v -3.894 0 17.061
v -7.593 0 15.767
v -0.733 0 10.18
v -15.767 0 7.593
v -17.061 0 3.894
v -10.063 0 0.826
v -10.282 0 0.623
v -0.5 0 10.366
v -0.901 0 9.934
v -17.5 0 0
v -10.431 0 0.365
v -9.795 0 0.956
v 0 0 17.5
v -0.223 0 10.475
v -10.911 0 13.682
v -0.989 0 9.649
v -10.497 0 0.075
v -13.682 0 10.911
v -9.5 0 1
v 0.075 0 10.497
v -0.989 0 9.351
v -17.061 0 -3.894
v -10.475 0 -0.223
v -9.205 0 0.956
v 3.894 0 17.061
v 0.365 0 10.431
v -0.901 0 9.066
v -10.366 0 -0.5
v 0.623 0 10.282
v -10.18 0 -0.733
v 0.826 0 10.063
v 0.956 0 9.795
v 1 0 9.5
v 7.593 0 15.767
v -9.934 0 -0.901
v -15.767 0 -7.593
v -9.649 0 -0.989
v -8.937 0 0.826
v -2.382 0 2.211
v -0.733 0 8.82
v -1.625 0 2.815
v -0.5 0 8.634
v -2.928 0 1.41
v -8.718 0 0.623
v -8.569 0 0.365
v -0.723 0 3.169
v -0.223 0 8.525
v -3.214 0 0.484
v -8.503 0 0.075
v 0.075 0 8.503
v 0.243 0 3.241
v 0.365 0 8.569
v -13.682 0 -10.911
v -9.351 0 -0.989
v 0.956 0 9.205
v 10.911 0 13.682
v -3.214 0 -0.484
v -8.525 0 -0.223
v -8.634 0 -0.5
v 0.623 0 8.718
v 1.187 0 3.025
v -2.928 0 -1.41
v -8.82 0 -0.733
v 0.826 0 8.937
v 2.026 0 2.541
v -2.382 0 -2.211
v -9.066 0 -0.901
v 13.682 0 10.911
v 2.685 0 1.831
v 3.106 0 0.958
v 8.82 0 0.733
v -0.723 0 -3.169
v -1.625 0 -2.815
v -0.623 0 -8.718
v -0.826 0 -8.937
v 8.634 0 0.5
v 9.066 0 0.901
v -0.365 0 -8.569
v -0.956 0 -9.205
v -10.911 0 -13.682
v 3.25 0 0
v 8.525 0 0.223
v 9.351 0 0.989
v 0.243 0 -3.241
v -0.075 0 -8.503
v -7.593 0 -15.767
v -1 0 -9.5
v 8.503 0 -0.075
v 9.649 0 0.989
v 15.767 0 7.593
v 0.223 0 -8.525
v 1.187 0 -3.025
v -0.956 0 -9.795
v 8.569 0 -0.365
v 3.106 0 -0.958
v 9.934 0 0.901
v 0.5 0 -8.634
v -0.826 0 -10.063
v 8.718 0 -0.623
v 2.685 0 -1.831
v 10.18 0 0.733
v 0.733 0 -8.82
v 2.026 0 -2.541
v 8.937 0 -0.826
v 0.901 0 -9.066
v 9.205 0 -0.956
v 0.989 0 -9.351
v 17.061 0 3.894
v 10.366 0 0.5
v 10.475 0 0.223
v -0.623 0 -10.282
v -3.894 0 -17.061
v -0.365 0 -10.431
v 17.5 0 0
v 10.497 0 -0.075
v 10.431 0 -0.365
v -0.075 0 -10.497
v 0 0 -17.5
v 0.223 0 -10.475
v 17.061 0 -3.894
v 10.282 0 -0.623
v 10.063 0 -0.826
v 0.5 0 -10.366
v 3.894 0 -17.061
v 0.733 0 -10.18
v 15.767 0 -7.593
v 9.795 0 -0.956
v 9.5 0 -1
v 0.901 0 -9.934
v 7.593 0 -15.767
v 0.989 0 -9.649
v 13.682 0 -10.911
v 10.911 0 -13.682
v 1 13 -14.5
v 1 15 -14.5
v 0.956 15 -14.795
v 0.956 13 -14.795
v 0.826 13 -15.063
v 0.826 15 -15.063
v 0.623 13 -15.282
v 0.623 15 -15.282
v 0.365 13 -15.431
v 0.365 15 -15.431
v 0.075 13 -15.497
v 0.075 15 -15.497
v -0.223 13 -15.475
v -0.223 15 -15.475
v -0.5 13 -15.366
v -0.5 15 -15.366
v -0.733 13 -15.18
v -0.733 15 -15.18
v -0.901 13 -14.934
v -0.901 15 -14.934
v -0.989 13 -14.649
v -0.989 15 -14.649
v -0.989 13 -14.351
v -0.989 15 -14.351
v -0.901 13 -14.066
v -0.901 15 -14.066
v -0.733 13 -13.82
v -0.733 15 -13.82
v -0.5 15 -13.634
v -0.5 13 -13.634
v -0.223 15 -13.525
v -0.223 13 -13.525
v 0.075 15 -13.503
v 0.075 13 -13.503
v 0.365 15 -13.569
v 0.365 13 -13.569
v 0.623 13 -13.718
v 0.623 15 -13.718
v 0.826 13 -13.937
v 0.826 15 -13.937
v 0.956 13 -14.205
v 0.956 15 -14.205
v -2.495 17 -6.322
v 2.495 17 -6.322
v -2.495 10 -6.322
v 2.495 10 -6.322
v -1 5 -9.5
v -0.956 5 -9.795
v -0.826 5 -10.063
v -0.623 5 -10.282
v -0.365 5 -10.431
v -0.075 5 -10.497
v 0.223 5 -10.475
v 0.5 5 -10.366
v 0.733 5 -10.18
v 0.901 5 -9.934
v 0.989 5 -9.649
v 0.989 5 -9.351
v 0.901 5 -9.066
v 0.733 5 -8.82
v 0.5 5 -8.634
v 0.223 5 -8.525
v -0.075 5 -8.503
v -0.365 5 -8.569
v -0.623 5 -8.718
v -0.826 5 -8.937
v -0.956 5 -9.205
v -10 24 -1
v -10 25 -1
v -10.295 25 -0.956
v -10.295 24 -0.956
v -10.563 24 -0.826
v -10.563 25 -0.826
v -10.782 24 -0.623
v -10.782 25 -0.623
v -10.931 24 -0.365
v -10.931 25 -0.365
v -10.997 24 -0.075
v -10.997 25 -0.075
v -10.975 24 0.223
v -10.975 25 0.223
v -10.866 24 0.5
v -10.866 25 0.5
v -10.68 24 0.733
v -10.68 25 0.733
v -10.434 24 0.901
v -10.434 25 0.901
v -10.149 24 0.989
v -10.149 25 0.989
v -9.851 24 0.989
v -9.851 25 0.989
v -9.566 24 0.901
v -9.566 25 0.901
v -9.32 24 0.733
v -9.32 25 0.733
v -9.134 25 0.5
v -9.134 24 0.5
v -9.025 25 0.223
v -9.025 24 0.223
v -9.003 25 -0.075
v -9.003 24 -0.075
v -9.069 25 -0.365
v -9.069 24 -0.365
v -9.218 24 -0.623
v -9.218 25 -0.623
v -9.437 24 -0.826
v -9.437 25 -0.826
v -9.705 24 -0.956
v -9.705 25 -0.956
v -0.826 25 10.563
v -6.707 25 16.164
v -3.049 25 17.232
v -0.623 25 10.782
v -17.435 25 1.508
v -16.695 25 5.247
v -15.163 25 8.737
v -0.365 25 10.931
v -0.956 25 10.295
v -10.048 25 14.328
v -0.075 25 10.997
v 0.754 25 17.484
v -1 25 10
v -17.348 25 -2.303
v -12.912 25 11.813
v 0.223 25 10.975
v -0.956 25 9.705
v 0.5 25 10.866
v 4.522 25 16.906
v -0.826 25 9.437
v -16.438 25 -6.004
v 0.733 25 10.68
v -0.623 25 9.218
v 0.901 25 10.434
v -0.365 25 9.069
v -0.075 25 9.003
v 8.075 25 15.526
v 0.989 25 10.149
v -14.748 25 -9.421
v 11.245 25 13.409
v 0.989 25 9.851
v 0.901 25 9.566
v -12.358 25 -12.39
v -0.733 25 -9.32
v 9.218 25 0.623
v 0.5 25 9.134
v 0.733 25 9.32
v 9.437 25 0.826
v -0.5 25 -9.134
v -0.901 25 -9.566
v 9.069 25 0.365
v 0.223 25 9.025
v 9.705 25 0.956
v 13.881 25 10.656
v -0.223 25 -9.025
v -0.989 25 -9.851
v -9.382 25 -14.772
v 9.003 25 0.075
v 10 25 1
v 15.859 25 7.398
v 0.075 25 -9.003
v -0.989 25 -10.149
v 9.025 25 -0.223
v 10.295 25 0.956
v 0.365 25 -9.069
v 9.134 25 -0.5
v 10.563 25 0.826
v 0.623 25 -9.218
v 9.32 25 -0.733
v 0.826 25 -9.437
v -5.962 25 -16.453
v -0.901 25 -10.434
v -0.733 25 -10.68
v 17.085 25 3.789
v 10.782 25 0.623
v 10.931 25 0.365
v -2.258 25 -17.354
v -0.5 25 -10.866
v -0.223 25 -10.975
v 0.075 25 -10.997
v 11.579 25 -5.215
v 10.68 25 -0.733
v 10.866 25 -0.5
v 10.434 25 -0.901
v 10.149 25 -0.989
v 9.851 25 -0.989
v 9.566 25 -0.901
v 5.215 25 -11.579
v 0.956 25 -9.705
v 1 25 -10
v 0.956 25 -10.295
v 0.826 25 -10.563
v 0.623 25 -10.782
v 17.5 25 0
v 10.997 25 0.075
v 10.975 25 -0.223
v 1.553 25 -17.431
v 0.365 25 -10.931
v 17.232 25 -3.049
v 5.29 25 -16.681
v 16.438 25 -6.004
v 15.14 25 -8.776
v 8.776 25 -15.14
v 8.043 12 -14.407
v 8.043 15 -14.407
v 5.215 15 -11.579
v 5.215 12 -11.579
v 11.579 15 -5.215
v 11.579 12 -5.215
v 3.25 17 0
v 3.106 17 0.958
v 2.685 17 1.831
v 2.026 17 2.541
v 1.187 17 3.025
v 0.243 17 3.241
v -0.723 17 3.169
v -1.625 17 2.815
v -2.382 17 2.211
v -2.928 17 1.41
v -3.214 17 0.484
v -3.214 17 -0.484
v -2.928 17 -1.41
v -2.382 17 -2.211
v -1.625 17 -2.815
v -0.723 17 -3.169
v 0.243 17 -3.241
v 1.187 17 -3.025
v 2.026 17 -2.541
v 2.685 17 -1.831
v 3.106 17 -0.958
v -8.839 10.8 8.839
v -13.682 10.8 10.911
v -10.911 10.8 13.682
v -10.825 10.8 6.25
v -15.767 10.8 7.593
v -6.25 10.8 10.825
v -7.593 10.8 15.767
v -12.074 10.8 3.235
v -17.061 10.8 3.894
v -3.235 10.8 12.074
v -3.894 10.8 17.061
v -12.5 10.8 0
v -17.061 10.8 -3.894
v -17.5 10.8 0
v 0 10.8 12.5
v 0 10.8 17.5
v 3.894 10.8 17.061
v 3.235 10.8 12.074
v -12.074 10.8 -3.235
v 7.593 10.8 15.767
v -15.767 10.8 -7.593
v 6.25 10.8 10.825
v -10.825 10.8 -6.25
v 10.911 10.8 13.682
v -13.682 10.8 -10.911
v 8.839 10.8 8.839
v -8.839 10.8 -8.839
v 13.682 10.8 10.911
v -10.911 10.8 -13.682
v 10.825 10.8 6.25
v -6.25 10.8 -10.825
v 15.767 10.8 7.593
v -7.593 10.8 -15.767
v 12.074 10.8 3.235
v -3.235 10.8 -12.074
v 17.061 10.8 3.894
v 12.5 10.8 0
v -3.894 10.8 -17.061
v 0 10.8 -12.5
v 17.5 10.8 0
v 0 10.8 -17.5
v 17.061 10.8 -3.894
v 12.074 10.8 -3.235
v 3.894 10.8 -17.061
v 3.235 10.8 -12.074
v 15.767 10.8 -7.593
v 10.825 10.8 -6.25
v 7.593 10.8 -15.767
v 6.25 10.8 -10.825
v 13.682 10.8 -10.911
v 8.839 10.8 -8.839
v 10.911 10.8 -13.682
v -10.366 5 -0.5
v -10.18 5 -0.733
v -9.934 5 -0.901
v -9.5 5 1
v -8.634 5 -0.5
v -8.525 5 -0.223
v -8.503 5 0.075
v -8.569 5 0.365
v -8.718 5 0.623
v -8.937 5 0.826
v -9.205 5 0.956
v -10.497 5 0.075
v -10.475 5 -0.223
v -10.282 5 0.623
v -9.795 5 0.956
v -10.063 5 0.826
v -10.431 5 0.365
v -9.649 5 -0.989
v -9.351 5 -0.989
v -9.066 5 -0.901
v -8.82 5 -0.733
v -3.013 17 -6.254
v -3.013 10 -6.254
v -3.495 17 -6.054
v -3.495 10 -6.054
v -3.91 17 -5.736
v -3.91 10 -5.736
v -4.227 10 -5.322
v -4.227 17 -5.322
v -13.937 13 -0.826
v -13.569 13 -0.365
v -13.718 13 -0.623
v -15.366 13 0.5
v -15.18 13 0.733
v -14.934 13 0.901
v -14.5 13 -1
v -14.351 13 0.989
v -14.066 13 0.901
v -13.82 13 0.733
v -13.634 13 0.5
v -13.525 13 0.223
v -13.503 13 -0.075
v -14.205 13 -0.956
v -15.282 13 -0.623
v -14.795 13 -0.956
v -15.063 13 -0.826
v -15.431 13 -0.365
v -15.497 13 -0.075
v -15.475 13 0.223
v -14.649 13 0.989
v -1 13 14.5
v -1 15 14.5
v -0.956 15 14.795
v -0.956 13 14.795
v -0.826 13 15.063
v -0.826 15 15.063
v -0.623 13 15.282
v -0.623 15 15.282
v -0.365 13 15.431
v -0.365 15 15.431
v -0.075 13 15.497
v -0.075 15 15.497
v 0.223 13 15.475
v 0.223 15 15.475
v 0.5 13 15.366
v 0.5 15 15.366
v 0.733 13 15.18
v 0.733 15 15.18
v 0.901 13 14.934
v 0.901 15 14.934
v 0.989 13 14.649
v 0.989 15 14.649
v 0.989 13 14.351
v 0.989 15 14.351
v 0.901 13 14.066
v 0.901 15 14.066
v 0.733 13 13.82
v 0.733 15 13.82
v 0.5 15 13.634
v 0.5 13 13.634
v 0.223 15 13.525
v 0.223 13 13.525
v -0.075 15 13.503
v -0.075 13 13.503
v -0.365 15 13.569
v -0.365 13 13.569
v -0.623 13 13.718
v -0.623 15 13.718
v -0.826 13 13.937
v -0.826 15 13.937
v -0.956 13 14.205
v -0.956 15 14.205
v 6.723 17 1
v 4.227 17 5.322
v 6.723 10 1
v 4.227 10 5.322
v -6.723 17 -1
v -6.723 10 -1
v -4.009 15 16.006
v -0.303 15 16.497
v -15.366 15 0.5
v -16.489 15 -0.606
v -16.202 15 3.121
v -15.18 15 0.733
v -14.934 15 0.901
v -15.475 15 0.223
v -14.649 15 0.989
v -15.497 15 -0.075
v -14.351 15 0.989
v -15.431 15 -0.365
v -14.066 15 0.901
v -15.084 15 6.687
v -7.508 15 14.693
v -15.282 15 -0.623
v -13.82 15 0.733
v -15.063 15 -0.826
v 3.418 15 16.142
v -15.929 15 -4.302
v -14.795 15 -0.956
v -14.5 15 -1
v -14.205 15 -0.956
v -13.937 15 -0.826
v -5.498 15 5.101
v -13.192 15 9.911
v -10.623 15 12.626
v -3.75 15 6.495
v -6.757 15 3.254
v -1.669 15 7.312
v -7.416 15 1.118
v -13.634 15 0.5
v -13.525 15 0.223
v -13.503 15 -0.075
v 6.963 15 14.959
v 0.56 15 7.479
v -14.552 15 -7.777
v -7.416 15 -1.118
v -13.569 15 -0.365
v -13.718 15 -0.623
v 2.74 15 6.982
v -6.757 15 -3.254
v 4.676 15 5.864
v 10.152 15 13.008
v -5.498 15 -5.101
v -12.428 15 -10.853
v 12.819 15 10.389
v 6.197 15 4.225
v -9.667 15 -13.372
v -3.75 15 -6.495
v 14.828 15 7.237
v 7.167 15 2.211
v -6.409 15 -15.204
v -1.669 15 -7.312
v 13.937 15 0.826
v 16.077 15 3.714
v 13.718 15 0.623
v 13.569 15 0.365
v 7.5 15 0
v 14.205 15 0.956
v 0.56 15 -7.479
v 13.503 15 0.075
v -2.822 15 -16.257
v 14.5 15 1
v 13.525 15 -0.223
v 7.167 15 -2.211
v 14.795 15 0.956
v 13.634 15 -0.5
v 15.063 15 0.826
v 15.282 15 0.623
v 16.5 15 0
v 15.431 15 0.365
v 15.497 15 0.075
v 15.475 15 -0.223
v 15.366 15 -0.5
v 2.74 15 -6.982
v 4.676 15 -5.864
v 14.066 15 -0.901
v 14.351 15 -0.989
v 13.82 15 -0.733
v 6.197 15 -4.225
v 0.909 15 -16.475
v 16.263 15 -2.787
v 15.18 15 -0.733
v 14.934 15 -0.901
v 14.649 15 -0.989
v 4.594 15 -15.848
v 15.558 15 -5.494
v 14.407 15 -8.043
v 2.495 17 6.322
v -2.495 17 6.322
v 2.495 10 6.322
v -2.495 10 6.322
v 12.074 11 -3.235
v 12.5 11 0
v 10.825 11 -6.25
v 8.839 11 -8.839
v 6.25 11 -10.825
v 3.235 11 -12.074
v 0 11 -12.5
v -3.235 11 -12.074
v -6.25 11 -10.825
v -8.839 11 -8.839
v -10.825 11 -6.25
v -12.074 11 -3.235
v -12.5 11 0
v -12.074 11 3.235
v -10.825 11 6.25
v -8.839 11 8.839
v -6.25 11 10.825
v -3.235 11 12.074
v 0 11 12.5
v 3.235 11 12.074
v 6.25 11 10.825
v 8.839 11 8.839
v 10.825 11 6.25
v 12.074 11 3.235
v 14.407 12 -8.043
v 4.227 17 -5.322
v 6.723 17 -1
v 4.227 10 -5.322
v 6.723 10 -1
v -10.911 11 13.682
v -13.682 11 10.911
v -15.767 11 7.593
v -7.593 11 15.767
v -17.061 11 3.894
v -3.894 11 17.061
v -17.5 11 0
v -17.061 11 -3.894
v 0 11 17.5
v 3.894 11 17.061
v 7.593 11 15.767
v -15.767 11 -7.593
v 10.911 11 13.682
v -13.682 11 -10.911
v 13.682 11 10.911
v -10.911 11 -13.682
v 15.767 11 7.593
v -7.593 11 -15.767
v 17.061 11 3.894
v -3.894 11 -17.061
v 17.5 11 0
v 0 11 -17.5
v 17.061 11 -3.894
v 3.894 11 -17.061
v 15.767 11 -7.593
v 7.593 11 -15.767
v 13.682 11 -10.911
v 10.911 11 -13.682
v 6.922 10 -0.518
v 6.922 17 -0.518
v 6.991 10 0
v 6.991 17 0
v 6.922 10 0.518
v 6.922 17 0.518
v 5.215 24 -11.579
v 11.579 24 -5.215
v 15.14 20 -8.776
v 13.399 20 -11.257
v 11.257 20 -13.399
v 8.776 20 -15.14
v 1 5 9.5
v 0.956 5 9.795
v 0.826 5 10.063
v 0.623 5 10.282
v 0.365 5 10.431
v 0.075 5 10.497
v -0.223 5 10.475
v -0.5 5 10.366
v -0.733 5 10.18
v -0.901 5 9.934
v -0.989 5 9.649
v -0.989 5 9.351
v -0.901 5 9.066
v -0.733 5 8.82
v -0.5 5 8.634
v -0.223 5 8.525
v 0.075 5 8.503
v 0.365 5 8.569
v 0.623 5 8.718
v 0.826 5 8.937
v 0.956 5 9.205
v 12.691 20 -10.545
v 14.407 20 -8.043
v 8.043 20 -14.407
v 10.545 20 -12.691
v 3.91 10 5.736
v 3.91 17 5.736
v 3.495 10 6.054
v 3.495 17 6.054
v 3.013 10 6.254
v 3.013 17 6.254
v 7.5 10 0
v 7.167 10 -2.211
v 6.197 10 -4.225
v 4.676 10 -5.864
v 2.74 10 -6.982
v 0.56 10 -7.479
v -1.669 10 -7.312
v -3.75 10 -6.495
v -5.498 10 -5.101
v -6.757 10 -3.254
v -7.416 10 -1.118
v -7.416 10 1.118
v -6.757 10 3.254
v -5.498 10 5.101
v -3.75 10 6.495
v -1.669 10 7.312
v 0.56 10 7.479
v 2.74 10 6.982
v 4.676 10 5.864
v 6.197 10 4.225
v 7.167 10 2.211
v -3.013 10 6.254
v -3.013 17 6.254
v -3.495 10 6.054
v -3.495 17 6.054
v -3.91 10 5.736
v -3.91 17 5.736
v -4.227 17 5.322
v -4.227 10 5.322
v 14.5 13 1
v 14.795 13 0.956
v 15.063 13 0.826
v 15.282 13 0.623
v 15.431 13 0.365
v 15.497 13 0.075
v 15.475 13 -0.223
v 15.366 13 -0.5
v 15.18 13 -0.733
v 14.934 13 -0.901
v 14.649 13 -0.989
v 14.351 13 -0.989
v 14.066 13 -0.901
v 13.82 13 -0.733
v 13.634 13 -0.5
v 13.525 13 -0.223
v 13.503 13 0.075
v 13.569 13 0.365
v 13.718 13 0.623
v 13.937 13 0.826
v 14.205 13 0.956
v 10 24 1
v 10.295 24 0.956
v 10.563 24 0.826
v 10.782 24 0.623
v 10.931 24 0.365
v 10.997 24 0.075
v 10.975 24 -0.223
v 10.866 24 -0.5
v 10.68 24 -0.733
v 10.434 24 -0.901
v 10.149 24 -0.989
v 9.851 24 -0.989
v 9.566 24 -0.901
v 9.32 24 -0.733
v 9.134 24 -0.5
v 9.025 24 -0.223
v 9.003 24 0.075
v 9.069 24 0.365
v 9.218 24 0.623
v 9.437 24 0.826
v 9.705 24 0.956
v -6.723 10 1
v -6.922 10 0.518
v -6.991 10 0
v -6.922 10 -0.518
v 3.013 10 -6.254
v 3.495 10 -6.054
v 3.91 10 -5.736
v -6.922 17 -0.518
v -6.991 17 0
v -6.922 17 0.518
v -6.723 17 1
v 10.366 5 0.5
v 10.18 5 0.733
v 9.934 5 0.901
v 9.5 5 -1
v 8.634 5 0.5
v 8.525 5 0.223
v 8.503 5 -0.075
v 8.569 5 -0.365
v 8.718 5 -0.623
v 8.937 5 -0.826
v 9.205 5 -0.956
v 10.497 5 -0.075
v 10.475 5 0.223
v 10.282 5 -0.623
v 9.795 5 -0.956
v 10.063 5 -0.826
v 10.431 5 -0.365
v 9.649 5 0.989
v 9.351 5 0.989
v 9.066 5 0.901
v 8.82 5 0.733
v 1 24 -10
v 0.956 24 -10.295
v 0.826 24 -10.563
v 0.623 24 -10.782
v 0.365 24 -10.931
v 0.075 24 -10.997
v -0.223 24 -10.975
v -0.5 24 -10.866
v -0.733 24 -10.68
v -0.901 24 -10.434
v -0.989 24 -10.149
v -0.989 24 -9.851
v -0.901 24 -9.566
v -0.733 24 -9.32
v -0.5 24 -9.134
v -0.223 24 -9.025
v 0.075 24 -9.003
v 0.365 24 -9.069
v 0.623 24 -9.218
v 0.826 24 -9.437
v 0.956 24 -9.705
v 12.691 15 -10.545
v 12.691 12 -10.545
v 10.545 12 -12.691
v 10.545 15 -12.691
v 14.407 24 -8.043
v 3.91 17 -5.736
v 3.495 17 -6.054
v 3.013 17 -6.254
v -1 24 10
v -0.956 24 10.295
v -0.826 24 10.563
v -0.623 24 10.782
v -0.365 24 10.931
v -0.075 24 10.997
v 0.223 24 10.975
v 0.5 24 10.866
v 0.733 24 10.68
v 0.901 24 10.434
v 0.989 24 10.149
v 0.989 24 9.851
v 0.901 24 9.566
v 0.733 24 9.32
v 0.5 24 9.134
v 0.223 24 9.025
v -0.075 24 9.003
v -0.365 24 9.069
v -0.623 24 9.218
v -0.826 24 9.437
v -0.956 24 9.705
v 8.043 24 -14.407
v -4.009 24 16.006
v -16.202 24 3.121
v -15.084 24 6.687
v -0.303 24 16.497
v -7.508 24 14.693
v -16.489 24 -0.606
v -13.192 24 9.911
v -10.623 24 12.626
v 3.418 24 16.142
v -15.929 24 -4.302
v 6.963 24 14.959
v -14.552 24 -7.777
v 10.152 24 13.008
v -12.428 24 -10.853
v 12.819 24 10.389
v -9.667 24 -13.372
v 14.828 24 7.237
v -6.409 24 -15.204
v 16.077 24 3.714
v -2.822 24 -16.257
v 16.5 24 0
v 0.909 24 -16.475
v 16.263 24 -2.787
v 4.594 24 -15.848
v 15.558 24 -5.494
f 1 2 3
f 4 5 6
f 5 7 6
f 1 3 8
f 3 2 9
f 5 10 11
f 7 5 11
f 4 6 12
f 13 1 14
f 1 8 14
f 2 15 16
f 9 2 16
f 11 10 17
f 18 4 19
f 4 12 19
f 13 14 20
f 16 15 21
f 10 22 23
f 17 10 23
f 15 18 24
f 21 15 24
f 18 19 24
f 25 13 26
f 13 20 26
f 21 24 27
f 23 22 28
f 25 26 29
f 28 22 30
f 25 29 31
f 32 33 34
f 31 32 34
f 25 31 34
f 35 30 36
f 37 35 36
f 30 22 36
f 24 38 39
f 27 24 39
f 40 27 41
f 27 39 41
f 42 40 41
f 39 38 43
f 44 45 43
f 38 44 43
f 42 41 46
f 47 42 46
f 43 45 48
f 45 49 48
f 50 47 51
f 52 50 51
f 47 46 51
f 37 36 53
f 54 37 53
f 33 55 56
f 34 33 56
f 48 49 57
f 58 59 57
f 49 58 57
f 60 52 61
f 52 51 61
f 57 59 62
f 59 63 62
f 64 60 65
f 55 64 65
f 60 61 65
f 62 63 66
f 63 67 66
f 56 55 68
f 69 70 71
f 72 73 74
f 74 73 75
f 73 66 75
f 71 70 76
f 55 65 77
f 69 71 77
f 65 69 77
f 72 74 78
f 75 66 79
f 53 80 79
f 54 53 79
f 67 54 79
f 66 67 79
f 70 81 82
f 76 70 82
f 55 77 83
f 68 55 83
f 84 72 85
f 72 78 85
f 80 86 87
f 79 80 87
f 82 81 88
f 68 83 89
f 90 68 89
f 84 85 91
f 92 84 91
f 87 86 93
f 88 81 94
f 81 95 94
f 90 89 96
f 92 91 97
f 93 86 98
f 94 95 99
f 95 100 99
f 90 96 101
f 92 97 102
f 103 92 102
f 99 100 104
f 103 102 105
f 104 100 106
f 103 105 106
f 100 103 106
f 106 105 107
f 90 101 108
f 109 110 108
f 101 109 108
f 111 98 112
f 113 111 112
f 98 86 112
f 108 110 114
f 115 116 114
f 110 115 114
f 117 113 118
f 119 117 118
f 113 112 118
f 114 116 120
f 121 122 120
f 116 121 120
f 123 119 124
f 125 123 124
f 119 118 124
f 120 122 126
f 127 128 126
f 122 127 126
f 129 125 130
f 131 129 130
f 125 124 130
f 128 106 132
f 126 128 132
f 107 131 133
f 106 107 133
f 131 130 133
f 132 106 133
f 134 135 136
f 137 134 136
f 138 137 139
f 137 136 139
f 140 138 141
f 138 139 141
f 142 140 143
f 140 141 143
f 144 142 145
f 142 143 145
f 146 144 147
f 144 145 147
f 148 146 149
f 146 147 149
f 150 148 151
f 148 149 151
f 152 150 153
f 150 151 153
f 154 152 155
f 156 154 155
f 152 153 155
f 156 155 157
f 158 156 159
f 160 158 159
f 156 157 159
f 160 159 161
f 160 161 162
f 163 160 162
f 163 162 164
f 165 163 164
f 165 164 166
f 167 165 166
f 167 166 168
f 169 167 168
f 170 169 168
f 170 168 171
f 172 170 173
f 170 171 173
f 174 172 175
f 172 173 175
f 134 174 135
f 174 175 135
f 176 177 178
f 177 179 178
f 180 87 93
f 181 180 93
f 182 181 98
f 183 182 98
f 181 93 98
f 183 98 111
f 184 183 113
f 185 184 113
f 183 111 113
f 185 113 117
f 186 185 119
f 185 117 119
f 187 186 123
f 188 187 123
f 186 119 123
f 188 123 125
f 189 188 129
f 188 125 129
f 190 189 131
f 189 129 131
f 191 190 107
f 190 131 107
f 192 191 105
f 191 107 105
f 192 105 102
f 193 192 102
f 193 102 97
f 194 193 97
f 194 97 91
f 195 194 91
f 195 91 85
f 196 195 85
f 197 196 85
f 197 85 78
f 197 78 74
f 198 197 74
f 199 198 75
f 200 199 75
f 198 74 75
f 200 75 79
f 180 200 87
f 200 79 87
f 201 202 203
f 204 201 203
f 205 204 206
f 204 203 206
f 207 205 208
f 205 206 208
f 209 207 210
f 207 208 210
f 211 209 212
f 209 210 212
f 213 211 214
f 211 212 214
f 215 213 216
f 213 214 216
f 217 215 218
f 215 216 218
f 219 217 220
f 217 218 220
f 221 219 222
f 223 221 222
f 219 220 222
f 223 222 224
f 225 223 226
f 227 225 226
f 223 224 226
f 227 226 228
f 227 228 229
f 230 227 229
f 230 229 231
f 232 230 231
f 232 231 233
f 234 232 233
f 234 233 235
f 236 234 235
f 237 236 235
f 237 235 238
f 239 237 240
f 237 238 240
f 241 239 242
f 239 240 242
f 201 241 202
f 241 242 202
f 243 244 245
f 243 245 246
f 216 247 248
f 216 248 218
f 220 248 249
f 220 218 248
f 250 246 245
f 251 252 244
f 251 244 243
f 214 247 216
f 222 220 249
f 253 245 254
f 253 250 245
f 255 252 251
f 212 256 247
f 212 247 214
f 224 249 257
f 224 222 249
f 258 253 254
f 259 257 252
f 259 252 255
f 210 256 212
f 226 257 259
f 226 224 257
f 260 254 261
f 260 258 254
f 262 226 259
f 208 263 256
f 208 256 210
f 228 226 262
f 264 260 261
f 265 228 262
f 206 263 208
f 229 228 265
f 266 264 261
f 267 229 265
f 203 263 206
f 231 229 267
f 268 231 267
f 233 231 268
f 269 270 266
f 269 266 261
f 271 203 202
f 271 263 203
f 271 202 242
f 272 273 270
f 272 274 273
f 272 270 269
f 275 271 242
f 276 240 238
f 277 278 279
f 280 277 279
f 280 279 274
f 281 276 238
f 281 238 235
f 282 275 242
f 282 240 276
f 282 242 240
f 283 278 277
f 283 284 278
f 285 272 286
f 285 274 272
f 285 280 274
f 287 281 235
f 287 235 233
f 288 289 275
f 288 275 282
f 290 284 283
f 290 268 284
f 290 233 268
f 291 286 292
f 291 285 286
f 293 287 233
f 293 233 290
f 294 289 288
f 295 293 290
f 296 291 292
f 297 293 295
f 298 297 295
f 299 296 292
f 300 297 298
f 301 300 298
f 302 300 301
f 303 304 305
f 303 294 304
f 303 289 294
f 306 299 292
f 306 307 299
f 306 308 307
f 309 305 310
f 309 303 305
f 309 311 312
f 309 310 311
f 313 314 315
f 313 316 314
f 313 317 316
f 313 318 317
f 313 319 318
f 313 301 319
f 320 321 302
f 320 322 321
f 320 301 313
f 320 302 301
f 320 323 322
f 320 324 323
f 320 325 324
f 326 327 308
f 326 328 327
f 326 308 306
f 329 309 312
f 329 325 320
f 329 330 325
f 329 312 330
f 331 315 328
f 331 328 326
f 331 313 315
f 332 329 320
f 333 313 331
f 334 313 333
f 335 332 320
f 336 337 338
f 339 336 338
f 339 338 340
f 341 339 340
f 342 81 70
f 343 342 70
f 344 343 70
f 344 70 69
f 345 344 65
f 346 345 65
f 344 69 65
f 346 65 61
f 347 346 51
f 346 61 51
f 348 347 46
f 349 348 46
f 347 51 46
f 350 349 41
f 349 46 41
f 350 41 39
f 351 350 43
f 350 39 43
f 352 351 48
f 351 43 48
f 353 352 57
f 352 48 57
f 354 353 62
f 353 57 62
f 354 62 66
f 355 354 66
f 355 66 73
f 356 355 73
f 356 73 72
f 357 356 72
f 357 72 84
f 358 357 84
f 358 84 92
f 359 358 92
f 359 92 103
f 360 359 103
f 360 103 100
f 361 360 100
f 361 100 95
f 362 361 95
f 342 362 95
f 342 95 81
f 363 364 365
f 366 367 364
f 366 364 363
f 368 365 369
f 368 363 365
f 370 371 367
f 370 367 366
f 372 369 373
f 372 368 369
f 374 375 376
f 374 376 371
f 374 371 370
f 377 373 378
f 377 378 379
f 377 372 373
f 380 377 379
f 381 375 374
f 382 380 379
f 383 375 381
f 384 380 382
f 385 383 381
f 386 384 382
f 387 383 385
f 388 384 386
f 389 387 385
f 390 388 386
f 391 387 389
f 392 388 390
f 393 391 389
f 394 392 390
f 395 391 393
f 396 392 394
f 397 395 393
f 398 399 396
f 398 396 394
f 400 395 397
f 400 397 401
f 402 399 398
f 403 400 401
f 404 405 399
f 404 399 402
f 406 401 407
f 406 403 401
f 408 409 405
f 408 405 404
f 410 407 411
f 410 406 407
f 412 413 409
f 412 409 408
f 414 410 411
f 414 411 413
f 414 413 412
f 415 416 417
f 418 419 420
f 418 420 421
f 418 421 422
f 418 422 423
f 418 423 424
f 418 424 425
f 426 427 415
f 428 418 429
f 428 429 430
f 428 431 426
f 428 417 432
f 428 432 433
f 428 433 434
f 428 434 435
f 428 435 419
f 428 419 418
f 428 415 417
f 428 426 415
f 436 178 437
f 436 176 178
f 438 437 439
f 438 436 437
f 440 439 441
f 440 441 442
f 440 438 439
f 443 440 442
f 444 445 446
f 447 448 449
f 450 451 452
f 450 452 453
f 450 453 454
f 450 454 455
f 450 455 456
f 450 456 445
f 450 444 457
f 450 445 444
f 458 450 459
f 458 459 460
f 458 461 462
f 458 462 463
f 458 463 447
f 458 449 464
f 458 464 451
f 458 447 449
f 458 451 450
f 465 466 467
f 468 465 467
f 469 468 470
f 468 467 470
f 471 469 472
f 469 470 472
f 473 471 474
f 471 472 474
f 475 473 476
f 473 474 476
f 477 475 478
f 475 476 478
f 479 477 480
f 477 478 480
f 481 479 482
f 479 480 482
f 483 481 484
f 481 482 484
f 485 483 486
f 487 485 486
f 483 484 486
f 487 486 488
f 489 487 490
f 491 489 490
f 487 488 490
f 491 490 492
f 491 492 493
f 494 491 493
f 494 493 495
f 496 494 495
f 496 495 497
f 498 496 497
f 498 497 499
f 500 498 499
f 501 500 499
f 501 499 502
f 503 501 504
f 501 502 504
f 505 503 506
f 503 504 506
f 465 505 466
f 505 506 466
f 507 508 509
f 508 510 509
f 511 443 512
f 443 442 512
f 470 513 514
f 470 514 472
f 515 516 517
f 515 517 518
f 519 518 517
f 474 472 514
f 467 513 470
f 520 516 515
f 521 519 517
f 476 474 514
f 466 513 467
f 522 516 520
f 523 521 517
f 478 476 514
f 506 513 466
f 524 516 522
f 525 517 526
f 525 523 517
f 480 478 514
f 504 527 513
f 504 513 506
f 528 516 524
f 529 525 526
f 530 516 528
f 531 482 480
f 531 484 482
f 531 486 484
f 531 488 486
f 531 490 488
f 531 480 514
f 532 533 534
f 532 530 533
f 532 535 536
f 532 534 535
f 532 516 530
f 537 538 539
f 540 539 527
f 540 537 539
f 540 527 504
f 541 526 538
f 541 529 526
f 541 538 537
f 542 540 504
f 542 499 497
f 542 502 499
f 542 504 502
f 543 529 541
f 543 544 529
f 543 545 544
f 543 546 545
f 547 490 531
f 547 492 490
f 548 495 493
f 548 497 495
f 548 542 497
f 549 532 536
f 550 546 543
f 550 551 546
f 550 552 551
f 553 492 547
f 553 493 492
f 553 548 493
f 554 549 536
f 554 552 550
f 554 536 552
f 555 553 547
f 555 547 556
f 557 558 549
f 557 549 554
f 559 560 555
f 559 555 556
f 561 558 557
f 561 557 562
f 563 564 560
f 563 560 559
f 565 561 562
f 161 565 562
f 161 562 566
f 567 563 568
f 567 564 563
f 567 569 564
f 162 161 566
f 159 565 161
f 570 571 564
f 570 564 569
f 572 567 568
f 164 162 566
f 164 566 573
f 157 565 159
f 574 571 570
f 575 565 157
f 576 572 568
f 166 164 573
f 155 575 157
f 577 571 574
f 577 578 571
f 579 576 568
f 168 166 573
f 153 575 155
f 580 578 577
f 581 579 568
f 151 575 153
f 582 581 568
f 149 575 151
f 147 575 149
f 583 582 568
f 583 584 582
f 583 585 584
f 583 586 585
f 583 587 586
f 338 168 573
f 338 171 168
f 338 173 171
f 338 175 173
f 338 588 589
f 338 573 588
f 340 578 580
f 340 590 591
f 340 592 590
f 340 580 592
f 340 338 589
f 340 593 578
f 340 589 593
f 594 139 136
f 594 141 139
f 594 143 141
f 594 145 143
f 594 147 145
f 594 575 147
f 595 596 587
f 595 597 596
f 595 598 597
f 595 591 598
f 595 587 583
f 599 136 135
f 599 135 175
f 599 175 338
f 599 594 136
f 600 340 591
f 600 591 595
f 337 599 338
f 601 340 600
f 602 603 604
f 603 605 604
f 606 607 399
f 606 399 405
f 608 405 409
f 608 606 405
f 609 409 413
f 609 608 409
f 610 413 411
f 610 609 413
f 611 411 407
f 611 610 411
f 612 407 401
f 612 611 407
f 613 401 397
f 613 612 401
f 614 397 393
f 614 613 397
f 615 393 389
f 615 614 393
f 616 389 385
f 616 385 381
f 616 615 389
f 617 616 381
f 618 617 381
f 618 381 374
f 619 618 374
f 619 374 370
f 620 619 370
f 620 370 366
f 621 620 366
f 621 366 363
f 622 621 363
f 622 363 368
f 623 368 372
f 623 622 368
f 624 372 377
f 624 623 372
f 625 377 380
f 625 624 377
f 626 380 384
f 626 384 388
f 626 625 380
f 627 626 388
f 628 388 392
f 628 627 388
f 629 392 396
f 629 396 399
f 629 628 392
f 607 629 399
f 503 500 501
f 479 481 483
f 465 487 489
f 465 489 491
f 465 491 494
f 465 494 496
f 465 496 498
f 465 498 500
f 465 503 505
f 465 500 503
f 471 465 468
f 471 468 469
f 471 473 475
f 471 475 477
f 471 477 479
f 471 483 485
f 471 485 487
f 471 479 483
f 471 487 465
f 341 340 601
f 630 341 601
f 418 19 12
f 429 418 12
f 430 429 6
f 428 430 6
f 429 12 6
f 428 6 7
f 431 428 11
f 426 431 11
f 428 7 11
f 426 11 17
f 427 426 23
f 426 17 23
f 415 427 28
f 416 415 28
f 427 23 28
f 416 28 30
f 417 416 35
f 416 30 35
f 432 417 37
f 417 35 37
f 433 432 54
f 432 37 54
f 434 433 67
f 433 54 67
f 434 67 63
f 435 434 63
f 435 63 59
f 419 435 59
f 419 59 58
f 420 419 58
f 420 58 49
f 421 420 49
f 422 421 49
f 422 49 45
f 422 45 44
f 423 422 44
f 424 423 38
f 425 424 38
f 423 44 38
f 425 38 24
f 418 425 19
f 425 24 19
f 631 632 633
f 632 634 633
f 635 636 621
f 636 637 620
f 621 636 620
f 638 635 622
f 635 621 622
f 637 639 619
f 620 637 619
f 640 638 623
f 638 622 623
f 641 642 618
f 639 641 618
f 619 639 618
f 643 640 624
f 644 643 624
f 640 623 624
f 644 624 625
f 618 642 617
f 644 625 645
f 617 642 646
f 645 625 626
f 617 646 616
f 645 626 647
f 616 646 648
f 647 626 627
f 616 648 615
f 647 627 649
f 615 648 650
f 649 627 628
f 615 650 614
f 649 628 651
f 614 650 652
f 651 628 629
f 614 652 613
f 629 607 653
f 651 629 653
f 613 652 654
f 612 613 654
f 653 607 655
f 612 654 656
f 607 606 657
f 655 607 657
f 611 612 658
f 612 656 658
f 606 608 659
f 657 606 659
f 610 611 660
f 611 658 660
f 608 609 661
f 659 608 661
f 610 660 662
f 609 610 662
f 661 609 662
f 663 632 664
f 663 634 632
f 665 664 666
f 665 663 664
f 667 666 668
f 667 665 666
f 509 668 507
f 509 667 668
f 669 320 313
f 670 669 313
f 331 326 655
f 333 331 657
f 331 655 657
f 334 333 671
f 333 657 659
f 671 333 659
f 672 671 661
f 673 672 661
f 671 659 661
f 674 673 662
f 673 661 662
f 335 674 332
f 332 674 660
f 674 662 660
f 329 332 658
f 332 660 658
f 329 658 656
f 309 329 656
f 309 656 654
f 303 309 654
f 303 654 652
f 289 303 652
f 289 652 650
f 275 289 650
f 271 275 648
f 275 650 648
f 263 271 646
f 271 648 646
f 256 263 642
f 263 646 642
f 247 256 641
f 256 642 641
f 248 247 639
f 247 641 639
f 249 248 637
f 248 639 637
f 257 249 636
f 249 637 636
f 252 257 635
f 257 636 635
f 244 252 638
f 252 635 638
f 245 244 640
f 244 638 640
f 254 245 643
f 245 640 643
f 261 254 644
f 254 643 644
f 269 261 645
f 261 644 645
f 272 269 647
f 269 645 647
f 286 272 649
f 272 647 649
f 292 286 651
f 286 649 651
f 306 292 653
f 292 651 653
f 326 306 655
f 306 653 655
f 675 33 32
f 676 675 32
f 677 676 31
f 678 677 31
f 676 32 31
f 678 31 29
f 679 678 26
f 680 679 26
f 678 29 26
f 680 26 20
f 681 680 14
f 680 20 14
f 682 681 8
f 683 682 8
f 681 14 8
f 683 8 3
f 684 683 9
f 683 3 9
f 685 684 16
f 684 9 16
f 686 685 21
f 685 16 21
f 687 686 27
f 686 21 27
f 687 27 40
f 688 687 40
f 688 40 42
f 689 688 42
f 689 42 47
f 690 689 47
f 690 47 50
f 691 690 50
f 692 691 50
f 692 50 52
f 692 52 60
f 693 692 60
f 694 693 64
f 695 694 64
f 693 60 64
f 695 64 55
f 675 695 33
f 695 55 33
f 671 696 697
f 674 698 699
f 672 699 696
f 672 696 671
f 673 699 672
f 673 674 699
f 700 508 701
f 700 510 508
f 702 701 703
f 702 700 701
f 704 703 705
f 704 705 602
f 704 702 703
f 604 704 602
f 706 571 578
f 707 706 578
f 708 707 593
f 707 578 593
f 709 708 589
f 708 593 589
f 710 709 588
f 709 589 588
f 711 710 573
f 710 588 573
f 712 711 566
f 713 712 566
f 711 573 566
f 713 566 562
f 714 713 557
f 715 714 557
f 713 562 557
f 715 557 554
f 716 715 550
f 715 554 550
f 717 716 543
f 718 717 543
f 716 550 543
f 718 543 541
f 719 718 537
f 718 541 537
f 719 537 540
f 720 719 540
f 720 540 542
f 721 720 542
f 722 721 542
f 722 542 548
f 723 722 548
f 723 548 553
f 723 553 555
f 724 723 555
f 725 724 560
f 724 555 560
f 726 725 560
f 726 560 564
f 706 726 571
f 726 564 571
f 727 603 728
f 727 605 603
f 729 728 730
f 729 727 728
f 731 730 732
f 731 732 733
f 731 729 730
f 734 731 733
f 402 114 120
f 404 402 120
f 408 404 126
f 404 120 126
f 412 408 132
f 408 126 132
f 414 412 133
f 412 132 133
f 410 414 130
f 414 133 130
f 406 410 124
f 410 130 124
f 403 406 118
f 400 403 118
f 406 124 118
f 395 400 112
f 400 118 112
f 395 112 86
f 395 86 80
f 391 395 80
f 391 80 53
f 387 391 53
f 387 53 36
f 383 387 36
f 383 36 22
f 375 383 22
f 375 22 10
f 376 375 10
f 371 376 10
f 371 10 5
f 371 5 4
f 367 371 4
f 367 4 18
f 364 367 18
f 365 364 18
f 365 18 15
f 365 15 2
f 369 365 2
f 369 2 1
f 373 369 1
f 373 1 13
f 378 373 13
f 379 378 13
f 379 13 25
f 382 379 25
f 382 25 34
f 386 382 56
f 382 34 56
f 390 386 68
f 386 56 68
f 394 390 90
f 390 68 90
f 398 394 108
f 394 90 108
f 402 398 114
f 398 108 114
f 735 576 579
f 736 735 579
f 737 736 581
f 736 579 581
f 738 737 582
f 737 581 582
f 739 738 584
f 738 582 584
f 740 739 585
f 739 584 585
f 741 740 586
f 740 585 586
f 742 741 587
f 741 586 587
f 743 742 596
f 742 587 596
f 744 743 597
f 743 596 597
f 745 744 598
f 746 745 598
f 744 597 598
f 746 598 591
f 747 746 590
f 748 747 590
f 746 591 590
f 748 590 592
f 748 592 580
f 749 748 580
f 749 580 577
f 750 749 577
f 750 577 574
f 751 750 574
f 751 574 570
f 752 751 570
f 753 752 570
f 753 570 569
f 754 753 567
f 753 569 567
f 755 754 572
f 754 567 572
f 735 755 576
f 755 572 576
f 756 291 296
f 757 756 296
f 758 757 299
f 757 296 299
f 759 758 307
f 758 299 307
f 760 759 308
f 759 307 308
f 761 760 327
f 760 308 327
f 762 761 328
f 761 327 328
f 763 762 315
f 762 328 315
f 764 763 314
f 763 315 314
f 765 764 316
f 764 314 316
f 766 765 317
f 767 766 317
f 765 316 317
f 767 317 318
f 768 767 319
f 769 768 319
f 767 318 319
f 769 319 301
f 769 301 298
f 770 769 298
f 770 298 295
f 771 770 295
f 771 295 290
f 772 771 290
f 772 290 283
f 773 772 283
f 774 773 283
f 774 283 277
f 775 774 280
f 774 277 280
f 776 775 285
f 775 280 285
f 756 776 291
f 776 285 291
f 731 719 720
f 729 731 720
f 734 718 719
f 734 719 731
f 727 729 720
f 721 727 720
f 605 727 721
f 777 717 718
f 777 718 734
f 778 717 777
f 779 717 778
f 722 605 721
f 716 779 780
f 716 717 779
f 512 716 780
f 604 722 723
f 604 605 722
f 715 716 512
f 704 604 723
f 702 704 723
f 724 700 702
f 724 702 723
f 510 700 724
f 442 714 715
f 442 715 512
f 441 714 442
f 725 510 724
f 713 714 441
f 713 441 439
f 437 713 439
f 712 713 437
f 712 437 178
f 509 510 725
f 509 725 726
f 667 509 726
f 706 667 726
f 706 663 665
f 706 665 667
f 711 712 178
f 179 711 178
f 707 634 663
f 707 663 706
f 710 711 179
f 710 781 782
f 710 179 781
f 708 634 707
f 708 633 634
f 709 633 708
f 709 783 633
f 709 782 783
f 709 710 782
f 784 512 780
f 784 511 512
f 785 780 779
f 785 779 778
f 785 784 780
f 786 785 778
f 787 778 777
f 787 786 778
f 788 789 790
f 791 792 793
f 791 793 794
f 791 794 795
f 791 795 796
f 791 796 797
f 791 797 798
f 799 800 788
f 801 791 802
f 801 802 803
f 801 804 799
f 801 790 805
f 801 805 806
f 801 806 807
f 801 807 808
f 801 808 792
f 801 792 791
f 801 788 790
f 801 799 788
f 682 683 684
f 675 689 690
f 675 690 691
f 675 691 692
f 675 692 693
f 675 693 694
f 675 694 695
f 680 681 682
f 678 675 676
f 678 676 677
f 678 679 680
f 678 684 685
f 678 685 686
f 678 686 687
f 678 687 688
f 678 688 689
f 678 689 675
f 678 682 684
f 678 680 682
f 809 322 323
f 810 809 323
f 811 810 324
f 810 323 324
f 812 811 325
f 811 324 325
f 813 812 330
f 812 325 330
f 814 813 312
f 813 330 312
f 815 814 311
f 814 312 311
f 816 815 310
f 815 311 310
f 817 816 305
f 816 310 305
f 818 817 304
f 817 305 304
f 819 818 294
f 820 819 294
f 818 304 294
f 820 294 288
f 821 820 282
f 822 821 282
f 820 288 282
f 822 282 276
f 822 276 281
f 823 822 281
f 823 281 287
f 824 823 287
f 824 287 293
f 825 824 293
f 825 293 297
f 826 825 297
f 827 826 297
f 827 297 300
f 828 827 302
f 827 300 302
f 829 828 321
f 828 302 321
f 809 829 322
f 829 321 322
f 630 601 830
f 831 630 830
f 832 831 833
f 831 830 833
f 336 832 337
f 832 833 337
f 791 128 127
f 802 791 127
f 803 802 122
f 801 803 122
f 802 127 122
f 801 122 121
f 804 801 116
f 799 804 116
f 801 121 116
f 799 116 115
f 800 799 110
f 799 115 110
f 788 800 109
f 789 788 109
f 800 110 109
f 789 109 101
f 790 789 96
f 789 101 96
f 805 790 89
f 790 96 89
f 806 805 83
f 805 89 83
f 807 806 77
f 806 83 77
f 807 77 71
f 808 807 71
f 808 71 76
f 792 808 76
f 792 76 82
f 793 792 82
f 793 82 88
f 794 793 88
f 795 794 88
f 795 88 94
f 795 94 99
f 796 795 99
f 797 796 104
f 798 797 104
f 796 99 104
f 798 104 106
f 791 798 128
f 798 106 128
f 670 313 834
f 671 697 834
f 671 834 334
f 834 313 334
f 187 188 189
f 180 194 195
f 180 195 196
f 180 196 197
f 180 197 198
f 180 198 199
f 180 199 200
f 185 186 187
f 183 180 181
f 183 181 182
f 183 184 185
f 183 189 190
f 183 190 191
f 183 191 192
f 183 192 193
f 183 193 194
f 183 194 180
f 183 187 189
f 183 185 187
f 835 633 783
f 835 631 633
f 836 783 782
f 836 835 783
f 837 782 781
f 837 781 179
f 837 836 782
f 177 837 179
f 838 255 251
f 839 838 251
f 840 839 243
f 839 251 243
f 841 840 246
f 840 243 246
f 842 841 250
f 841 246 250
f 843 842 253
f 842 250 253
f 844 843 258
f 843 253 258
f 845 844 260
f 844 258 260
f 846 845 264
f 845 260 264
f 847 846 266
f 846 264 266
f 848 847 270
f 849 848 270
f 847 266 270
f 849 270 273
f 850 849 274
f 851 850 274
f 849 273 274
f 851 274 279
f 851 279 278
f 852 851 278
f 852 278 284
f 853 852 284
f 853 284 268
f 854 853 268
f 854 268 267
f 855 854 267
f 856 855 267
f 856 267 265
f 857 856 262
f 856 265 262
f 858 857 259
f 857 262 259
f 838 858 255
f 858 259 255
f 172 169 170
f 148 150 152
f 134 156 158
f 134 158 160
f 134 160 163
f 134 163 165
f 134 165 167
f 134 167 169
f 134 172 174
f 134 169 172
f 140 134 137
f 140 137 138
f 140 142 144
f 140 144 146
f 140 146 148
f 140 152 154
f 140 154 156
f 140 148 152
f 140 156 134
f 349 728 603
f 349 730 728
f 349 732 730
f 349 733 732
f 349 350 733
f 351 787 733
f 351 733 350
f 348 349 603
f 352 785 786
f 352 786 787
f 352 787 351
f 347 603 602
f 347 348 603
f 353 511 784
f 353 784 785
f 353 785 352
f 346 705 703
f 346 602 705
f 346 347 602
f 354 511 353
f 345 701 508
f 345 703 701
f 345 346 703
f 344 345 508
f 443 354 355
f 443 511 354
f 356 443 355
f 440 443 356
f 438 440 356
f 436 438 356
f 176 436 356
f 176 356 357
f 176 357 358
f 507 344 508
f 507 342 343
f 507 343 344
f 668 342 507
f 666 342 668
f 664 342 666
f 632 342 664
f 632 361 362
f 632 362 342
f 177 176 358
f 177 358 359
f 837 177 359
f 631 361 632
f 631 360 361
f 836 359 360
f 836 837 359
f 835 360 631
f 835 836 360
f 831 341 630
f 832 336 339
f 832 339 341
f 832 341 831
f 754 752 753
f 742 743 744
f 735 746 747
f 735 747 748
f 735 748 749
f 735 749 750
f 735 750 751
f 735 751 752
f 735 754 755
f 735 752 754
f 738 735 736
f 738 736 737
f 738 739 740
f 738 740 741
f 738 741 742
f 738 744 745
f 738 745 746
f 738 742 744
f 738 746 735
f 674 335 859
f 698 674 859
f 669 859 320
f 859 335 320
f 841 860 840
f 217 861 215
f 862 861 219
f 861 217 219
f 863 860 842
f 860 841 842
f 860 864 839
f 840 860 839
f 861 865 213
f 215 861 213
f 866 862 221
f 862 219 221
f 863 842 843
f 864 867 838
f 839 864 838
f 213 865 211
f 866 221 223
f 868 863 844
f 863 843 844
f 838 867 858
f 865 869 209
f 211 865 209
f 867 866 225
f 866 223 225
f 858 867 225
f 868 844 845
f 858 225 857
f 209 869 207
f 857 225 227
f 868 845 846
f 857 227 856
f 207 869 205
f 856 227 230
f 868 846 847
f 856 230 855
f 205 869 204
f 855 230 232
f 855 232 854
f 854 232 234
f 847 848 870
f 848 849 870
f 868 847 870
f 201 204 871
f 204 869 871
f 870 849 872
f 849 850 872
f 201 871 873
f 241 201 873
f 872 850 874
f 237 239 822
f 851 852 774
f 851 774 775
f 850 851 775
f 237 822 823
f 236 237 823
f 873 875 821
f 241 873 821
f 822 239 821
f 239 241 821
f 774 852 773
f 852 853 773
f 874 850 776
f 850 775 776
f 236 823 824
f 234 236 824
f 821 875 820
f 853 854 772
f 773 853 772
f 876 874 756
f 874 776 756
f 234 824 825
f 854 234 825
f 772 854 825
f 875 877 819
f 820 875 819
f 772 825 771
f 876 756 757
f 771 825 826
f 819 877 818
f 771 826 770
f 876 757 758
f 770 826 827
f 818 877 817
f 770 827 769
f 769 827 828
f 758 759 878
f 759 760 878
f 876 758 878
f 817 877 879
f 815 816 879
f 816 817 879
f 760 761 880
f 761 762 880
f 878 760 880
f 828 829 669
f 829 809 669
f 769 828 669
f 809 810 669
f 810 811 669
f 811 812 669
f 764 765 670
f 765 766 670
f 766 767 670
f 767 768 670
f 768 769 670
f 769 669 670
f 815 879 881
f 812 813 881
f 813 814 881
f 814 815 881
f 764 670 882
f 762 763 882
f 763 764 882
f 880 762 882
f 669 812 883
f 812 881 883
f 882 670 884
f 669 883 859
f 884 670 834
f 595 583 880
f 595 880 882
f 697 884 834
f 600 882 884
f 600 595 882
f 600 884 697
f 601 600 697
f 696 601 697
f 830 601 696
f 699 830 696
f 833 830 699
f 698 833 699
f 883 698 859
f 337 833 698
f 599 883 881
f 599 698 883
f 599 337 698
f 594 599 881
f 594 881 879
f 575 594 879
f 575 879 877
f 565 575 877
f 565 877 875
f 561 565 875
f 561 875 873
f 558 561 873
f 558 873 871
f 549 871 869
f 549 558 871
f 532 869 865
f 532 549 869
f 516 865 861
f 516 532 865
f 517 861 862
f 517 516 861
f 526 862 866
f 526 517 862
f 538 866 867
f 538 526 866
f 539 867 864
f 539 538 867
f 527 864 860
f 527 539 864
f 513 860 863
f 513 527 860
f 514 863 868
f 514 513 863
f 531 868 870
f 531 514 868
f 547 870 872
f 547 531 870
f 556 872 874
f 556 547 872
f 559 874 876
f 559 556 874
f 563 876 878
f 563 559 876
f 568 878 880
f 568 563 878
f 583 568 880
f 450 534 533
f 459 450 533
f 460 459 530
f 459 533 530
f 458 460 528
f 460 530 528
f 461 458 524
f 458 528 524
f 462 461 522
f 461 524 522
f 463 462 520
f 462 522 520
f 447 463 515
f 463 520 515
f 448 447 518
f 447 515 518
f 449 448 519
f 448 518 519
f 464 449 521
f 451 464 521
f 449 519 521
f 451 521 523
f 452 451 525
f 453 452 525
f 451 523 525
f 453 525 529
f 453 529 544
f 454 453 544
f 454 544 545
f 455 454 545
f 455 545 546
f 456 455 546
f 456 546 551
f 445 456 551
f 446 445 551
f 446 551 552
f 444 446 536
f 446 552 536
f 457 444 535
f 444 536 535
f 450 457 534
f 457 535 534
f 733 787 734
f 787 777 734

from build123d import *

# Parameters (mm, degrees)
SKETCH1_R           = 17.5
BOSS_EXTRUDE1_DEPTH = 15
BOSS_EXTRUDE2_DEPTH = 2
CUT_EXTRUDE1_REACH  = 19
SKETCH3_R           = 3.25
SKETCH4_R           = 1
CUT_EXTRUDE2_DEPTH  = 5
CIRPATTERN1_COUNT   = 4
SKETCH5_R           = 1
CUT_EXTRUDE3_DEPTH  = 2
CIRPATTERN2_COUNT   = 4
SKETCH6_R           = 7.5
CUT_EXTRUDE4_DEPTH  = 5
CUT_EXTRUDE6_START  = -4
SKETCH7_R           = 17.5
SKETCH7_R_2         = 12.5
CUT_EXTRUDE6_DEPTH  = 0.2
FILLET1_R           = 2
CUT_EXTRUDE7_DEPTH  = 3
SKETCH9_R           = 17.5
SKETCH9_R_2         = 16.5
BOSS_EXTRUDE3_DEPTH = 10
SKETCH10_R          = 16.5
BOSS_EXTRUDE4_DEPTH = 1
CUT_EXTRUDE8_DEPTH  = 5
SKETCH12_R          = 1
CUT_EXTRUDE9_DEPTH  = 1
CIRPATTERN3_COUNT   = 4


with BuildPart() as part:
    # Sketch1 → Boss-Extrude1 (new body)
    with BuildSketch(Plane(origin=(0, 0, 0), x_dir=(1, 0, 0), z_dir=(0, 1, 0))):
        Circle(SKETCH1_R)
    extrude(amount=BOSS_EXTRUDE1_DEPTH)

    # Sketch2 → Boss-Extrude2 (add)
    with BuildSketch(Plane(origin=(0, 15, 0), x_dir=(1, 0, 0), z_dir=(0, 1, 0))):
        Polygon((7.3, 0), (3.65, 6.321985448), (-3.65, 6.321985448), (-7.3, 0), (-3.65, -6.321985448), (3.65, -6.321985448), align=None)
    extrude(amount=BOSS_EXTRUDE2_DEPTH)

    # Sketch3 → Cut-Extrude1 (cut, up to next)
    with BuildSketch(Plane.XZ, mode=Mode.PRIVATE) as cut_extrude1_sk1:
        Circle(SKETCH3_R)
    cut_extrude1_tool1 = extrude(cut_extrude1_sk1.sketch, amount=-CUT_EXTRUDE1_REACH, mode=Mode.PRIVATE) & part.part
    add(cut_extrude1_tool1.solids().sort_by_distance((0, 0, 0))[0], mode=Mode.SUBTRACT)

    # Sketch4 → Cut-Extrude2 (cut)
    with BuildSketch(Plane.XZ):
        with Locations((0, 9.5)):
            Circle(SKETCH4_R)
    cut_extrude2 = extrude(amount=-CUT_EXTRUDE2_DEPTH, mode=Mode.SUBTRACT)

    # CirPattern1: Cut-Extrude2 ×4 about axis
    cirpattern1_axis = Axis((0, 0, 0), (0, 1, 0))
    for i in range(1, CIRPATTERN1_COUNT):
        add(cut_extrude2.rotate(cirpattern1_axis, i * 360 / CIRPATTERN1_COUNT), mode=Mode.SUBTRACT)

    # Sketch5 → Cut-Extrude3 (cut)
    with BuildSketch(Plane(origin=(0, 15, 0), x_dir=(1, 0, 0), z_dir=(0, 1, 0))):
        with Locations((0, 14.5)):
            Circle(SKETCH5_R)
    cut_extrude3 = extrude(amount=-CUT_EXTRUDE3_DEPTH, mode=Mode.SUBTRACT)

    # CirPattern2: Cut-Extrude3 ×4 about axis
    cirpattern2_axis = Axis((0, 0, 0), (0, 1, 0))
    for i in range(1, CIRPATTERN2_COUNT):
        add(cut_extrude3.rotate(cirpattern2_axis, i * 360 / CIRPATTERN2_COUNT), mode=Mode.SUBTRACT)

    # Sketch6 → Cut-Extrude4 (cut)
    with BuildSketch(Plane(origin=(0, 15, 0), x_dir=(1, 0, 0), z_dir=(0, 1, 0))):
        Circle(SKETCH6_R)
        Polygon((7.3, 0), (3.65, 6.321985448), (-3.65, 6.321985448), (-7.3, 0), (-3.65, -6.321985448), (3.65, -6.321985448), align=None, mode=Mode.SUBTRACT)
    extrude(amount=-CUT_EXTRUDE4_DEPTH, mode=Mode.SUBTRACT)

    # Sketch7 → Cut-Extrude6 (cut)
    with BuildSketch(Plane(origin=(0, 15, 0), x_dir=(1, 0, 0), z_dir=(0, 1, 0)).offset(CUT_EXTRUDE6_START)):
        Circle(SKETCH7_R)
        Circle(SKETCH7_R_2, mode=Mode.SUBTRACT)
    extrude(amount=-CUT_EXTRUDE6_DEPTH, mode=Mode.SUBTRACT)

    # Fillet1
    fillet1_edges = [part.edges().sort_by_distance(p)[0] for p in [
        (-7.3, 13.5, 0),
        (-3.65, 13.5, 6.321985448),
        (3.65, 13.5, 6.321985448),
        (7.3, 13.5, 0),
        (3.65, 13.5, -6.321985448),
        (-3.65, 13.5, -6.321985448),
    ]]
    fillet(fillet1_edges, radius=FILLET1_R)

    # Sketch8 → Cut-Extrude7 (cut)
    with BuildSketch(Plane(origin=(0, 15, 0), x_dir=(1, 0, 0), z_dir=(0, 1, 0))):
        with BuildLine():
            Line((8.042991645, 14.406952676), (5.21456452, 11.578525551))
            Line((5.21456452, 11.578525551), (11.578525551, 5.21456452))
            Line((11.578525551, 5.21456452), (14.406952676, 8.042991645))
            ThreePointArc((14.406952676, 8.042991645), (11.66726189, 11.66726189), (8.042991645, 14.406952676))
        make_face()
    extrude(amount=-CUT_EXTRUDE7_DEPTH, mode=Mode.SUBTRACT)

    # Sketch9 → Boss-Extrude3 (add)
    with BuildSketch(Plane(origin=(0, 15, 0), x_dir=(1, 0, 0), z_dir=(0, 1, 0))):
        Circle(SKETCH9_R)
        Circle(SKETCH9_R_2, mode=Mode.SUBTRACT)
    extrude(amount=BOSS_EXTRUDE3_DEPTH)

    # Sketch10 → Boss-Extrude4 (add)
    with BuildSketch(Plane(origin=(0, 25, 0), x_dir=(1, 0, 0), z_dir=(0, 1, 0))):
        Circle(SKETCH10_R)
    extrude(amount=-BOSS_EXTRUDE4_DEPTH)

    # Sketch11 → Cut-Extrude8 (cut)
    with BuildSketch(Plane(origin=(0, 25, 0), x_dir=(1, 0, 0), z_dir=(0, 1, 0))):
        with BuildLine():
            Line((5.21456452, 11.578525551), (11.578525551, 5.21456452))
            Line((11.578525551, 5.21456452), (15.140241258, 8.776280228))
            ThreePointArc((15.140241258, 8.776280228), (12.374368671, 12.374368671), (8.776280228, 15.140241258))
            Line((8.776280228, 15.140241258), (5.21456452, 11.578525551))
        make_face()
    extrude(amount=-CUT_EXTRUDE8_DEPTH, mode=Mode.SUBTRACT)

    # Sketch12 → Cut-Extrude9 (cut)
    with BuildSketch(Plane(origin=(0, 25, 0), x_dir=(1, 0, 0), z_dir=(0, 1, 0))):
        with Locations((0, 10)):
            Circle(SKETCH12_R)
    cut_extrude9 = extrude(amount=-CUT_EXTRUDE9_DEPTH, mode=Mode.SUBTRACT)

    # CirPattern3: Cut-Extrude9 ×4 about axis
    cirpattern3_axis = Axis((0, 0, 0), (0, 1, 0))
    for i in range(1, CIRPATTERN3_COUNT):
        add(cut_extrude9.rotate(cirpattern3_axis, i * 360 / CIRPATTERN3_COUNT), mode=Mode.SUBTRACT)


solid = part.part
